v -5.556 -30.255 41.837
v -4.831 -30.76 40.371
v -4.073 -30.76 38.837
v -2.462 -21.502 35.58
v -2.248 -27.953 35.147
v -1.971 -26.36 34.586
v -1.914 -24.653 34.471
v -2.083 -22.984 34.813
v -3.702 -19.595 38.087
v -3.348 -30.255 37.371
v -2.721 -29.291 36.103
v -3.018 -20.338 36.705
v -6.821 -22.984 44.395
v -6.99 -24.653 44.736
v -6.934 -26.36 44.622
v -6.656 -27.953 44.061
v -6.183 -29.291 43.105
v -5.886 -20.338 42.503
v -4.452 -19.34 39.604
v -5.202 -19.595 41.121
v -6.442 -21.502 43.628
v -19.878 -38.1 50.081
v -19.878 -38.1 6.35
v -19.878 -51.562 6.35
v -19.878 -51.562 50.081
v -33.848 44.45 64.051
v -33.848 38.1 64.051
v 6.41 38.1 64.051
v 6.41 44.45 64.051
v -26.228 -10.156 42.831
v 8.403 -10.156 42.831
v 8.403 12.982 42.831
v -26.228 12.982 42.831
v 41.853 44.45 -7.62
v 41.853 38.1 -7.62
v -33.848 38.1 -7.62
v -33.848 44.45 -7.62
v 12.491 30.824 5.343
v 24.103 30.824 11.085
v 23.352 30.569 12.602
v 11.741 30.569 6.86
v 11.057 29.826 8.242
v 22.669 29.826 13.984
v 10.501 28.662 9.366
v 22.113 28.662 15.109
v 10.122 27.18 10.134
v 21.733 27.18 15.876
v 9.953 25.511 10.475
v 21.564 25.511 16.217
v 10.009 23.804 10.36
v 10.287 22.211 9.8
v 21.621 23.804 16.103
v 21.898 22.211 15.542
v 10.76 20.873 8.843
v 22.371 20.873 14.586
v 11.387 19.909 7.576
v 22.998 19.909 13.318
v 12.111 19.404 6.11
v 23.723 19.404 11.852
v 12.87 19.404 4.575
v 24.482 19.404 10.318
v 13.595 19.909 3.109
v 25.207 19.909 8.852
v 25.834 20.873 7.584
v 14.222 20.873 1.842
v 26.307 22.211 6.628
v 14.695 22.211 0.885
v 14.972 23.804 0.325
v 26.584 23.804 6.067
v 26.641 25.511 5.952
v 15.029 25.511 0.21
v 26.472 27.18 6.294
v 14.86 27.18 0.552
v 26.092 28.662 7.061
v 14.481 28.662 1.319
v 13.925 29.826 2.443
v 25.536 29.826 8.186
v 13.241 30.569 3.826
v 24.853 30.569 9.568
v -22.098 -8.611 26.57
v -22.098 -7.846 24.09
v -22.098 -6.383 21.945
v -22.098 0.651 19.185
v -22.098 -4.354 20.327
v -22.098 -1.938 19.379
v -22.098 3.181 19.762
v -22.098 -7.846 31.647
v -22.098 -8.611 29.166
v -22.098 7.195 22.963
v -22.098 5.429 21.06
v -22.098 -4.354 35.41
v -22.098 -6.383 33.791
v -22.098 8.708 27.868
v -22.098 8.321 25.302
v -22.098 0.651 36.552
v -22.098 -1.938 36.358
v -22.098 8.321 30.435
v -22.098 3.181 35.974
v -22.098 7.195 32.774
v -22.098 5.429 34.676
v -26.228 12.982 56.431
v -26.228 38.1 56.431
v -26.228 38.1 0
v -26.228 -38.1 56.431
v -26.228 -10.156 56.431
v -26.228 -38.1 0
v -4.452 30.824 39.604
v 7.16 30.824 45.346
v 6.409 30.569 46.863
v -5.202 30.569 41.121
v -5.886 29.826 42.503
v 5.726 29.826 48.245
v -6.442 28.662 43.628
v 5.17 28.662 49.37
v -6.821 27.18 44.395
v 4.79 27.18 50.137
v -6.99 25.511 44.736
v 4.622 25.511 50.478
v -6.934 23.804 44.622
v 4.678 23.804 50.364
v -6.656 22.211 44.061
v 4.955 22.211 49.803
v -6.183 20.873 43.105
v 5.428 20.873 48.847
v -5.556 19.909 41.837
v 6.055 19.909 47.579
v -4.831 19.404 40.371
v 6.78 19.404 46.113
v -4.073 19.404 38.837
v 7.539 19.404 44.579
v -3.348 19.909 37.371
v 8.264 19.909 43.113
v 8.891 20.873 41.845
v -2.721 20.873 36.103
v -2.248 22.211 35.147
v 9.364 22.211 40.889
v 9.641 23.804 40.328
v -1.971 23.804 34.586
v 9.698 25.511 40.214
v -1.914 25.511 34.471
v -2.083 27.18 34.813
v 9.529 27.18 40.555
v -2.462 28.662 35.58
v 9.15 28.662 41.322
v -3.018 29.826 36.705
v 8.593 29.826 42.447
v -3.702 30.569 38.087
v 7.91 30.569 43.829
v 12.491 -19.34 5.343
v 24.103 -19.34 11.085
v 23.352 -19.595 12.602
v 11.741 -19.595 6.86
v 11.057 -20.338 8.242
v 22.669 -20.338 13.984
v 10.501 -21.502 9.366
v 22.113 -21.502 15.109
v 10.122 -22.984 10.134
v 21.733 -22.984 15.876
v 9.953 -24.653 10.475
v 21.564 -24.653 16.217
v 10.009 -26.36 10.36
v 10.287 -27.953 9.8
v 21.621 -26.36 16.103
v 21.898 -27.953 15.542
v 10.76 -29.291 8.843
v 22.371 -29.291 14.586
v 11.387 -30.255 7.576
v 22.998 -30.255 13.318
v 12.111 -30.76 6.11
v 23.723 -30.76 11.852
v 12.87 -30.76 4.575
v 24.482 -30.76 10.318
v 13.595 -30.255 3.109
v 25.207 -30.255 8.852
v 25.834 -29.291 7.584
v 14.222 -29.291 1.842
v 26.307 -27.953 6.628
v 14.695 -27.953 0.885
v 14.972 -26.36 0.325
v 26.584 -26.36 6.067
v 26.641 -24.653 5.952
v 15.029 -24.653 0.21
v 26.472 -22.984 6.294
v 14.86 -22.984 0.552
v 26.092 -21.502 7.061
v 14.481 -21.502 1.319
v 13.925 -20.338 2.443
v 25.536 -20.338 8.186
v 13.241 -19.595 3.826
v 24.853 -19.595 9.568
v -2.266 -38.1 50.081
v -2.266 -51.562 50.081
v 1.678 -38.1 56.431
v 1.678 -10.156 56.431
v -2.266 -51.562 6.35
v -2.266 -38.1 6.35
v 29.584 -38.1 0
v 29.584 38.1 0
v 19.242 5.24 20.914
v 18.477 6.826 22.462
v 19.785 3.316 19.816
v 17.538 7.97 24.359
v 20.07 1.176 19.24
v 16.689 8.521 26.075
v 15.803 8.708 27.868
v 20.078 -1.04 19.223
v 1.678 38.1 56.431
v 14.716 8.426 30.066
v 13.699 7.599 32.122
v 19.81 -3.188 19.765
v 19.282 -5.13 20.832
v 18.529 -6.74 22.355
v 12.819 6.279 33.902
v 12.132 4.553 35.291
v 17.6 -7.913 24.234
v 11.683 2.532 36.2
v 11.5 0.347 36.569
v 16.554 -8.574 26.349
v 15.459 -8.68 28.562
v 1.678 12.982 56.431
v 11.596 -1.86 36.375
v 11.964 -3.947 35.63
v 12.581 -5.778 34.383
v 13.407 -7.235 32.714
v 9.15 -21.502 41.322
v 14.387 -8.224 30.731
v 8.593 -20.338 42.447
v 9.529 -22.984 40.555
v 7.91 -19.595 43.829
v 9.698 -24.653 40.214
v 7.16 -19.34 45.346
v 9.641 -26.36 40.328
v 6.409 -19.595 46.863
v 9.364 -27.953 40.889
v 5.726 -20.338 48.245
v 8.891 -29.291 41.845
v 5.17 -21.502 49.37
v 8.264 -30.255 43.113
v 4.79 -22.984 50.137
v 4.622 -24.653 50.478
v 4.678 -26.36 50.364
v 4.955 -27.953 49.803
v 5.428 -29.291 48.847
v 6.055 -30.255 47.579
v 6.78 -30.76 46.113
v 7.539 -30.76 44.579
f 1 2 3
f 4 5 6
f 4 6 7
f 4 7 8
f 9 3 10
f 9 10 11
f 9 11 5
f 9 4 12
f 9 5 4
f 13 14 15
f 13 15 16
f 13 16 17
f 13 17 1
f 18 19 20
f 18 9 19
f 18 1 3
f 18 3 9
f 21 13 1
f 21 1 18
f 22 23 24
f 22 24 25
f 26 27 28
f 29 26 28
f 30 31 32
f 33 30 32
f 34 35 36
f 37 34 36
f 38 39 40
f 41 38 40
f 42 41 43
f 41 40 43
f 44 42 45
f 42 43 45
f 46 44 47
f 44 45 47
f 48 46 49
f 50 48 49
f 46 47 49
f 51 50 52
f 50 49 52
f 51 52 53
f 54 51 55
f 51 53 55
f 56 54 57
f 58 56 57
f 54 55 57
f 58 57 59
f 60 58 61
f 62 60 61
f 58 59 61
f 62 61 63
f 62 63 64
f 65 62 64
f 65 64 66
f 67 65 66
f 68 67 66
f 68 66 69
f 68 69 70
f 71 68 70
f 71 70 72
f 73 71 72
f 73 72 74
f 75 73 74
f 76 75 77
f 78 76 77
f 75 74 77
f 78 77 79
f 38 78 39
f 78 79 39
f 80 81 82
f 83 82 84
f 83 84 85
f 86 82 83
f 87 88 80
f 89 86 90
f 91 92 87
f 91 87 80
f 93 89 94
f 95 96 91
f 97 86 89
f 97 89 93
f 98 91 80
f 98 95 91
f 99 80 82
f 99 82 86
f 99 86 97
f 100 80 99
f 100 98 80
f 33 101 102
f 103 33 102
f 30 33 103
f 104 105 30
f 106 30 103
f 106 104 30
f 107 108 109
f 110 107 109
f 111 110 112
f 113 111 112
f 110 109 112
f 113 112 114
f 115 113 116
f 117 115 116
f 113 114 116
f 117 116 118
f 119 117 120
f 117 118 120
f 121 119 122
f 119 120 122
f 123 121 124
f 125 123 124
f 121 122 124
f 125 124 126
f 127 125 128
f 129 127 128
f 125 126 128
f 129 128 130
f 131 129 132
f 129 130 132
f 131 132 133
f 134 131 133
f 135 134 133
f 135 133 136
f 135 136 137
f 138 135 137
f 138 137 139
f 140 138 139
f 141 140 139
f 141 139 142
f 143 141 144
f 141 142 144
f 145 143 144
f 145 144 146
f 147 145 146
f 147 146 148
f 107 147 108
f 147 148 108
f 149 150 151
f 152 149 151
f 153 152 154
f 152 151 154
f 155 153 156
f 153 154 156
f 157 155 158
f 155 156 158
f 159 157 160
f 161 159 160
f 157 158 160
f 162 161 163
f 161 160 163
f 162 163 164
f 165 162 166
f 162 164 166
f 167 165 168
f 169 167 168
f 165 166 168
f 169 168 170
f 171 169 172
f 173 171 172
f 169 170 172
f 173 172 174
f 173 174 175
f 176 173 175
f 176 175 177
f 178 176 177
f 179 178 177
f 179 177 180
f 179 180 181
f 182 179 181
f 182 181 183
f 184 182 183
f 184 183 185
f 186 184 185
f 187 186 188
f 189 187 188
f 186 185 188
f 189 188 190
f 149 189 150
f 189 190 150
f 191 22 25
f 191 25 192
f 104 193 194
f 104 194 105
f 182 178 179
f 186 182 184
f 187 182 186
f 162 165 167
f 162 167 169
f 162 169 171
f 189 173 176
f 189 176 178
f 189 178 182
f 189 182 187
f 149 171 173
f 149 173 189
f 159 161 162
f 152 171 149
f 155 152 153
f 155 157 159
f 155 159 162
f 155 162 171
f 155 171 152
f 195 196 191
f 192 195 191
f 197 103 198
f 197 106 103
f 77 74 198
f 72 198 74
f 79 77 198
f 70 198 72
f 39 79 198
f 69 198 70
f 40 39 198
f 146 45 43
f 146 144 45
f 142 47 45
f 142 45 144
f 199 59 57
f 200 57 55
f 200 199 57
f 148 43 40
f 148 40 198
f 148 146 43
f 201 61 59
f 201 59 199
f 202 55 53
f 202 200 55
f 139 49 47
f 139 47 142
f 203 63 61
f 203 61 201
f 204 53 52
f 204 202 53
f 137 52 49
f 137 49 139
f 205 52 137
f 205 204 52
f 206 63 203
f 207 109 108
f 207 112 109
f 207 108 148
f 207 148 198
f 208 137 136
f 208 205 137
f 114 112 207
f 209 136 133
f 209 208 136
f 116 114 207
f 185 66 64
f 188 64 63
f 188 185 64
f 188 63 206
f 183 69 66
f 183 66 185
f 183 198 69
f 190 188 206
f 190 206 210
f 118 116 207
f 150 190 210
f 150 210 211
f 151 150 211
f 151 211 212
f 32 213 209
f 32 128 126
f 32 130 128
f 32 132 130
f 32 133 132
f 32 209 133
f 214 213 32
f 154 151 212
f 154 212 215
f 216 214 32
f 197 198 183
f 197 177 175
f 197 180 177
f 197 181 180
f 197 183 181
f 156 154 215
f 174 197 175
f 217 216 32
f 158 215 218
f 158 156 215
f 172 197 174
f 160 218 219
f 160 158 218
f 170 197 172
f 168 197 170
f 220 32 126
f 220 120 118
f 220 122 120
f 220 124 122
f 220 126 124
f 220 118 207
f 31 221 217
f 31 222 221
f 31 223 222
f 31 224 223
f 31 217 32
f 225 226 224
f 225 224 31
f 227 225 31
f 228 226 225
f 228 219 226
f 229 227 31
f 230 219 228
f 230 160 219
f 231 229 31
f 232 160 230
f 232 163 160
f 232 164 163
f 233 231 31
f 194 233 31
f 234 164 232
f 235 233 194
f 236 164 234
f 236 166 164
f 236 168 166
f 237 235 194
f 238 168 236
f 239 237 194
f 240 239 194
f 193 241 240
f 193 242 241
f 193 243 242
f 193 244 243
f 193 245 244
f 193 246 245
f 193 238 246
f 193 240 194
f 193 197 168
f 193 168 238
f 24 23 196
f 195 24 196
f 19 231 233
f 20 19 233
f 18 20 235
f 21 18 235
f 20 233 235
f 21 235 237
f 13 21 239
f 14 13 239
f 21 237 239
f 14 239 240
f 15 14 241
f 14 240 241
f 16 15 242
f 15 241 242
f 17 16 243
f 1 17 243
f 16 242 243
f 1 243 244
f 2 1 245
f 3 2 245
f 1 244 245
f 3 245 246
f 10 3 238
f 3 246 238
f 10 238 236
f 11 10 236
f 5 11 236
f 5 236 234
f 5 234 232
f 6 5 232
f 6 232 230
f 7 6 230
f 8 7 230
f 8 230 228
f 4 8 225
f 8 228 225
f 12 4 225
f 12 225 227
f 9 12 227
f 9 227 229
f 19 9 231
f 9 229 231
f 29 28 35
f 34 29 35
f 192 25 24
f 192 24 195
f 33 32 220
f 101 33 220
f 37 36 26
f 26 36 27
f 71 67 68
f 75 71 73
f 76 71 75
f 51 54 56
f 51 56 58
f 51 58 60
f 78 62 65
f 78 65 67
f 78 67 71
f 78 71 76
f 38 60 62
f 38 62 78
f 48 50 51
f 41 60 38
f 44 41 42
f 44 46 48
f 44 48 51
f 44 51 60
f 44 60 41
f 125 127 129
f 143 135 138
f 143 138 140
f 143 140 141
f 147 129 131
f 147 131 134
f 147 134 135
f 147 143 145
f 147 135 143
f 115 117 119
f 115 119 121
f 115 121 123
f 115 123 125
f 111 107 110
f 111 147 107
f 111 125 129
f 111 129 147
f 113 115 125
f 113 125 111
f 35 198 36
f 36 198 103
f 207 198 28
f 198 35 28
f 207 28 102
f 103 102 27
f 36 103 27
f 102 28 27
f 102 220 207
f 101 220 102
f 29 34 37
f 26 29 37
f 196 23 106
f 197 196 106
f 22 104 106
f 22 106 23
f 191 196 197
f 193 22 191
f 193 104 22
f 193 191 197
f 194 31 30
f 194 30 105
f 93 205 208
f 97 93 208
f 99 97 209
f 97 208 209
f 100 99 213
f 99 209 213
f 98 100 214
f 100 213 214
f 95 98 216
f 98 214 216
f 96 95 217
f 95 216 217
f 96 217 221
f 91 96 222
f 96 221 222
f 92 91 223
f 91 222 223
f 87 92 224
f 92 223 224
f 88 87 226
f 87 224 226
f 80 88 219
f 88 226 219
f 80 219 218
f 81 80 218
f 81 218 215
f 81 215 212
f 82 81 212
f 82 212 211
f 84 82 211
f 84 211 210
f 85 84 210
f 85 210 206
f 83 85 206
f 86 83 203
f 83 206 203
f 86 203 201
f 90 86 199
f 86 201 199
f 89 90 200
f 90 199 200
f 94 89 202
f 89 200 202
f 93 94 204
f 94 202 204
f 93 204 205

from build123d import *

# Parameters (mm, degrees)
F1_DEPTH  = 38.1
F2_R      = 8.7079162596
F3_DEPTH  = 22.098
F5_DEPTH  = 6.35
F6_R      = 5.7417418986
F7_DEPTH  = 12.954
F8_W      = 23.137550801
F8_H      = 13.5999321938
F9_DEPTH  = 28.448
F10_W     = 17.6125467173
F10_H     = 43.7308948815
F11_DEPTH = 13.462


with BuildPart() as f1:
    # F0 (on Front) → F1 (new body, symmetric)
    with BuildSketch(Plane.XZ):
        Polygon((-26.2284446508, 0), (29.5842699707, 0), (1.6779126599, 56.4308948815), (-26.2284446508, 56.4308948815), align=None)
    extrude(amount=F1_DEPTH, both=True)

    # F2 (on Right) → F3 (cut, symmetric)
    with BuildSketch(Plane.YZ):
        with Locations((0, 27.8683193028)):
            Circle(F2_R)
    extrude(amount=F3_DEPTH, both=True, mode=Mode.SUBTRACT)

    # F4 (on face) → F5 (join)
    with BuildSketch(Plane(origin=(0, 38.1, 0), x_dir=(-1, 0, 0), z_dir=(0, 1, 0))):
        Polygon((33.8484448314, 64.0508950621), (-6.4104854842, 64.0508950621), (-41.8533686003, -7.6200001806), (33.8484448314, -7.6200001806), align=None)
    extrude(amount=F5_DEPTH)

    # F6 (on face) → F7 (cut)
    with BuildSketch(Plane(origin=(23.7710066009, 0, 11.7553018649), x_dir=(0, 1, 0), z_dir=(0.8963824764, 0, 0.4432814636))):
        with Locations((-25.0819269568, 37.4737083912)):
            Circle(F6_R)
        with Locations((25.0819269568, 37.4737083912)):
            Circle(F6_R)
        with Locations((-25.0819269568, -0.7479891615)):
            Circle(F6_R)
        with Locations((25.0819269568, -0.7479891615)):
            Circle(F6_R)
    extrude(amount=-F7_DEPTH, mode=Mode.SUBTRACT)

    # F8 (on Right) → F9 (cut, symmetric)
    with BuildSketch(Plane.YZ):
        with Locations((1.4129802585, 49.6309287846)):
            Rectangle(F8_W, F8_H)
    extrude(amount=F9_DEPTH, both=True, mode=Mode.SUBTRACT)

    # F10 (on face) → F11 (join)
    with BuildSketch(Plane.XZ.offset(38.1)):
        with Locations((-11.0721712921, 28.2154474407)):
            Rectangle(F10_W, F10_H)
    extrude(amount=F11_DEPTH)


solid = f1.part
